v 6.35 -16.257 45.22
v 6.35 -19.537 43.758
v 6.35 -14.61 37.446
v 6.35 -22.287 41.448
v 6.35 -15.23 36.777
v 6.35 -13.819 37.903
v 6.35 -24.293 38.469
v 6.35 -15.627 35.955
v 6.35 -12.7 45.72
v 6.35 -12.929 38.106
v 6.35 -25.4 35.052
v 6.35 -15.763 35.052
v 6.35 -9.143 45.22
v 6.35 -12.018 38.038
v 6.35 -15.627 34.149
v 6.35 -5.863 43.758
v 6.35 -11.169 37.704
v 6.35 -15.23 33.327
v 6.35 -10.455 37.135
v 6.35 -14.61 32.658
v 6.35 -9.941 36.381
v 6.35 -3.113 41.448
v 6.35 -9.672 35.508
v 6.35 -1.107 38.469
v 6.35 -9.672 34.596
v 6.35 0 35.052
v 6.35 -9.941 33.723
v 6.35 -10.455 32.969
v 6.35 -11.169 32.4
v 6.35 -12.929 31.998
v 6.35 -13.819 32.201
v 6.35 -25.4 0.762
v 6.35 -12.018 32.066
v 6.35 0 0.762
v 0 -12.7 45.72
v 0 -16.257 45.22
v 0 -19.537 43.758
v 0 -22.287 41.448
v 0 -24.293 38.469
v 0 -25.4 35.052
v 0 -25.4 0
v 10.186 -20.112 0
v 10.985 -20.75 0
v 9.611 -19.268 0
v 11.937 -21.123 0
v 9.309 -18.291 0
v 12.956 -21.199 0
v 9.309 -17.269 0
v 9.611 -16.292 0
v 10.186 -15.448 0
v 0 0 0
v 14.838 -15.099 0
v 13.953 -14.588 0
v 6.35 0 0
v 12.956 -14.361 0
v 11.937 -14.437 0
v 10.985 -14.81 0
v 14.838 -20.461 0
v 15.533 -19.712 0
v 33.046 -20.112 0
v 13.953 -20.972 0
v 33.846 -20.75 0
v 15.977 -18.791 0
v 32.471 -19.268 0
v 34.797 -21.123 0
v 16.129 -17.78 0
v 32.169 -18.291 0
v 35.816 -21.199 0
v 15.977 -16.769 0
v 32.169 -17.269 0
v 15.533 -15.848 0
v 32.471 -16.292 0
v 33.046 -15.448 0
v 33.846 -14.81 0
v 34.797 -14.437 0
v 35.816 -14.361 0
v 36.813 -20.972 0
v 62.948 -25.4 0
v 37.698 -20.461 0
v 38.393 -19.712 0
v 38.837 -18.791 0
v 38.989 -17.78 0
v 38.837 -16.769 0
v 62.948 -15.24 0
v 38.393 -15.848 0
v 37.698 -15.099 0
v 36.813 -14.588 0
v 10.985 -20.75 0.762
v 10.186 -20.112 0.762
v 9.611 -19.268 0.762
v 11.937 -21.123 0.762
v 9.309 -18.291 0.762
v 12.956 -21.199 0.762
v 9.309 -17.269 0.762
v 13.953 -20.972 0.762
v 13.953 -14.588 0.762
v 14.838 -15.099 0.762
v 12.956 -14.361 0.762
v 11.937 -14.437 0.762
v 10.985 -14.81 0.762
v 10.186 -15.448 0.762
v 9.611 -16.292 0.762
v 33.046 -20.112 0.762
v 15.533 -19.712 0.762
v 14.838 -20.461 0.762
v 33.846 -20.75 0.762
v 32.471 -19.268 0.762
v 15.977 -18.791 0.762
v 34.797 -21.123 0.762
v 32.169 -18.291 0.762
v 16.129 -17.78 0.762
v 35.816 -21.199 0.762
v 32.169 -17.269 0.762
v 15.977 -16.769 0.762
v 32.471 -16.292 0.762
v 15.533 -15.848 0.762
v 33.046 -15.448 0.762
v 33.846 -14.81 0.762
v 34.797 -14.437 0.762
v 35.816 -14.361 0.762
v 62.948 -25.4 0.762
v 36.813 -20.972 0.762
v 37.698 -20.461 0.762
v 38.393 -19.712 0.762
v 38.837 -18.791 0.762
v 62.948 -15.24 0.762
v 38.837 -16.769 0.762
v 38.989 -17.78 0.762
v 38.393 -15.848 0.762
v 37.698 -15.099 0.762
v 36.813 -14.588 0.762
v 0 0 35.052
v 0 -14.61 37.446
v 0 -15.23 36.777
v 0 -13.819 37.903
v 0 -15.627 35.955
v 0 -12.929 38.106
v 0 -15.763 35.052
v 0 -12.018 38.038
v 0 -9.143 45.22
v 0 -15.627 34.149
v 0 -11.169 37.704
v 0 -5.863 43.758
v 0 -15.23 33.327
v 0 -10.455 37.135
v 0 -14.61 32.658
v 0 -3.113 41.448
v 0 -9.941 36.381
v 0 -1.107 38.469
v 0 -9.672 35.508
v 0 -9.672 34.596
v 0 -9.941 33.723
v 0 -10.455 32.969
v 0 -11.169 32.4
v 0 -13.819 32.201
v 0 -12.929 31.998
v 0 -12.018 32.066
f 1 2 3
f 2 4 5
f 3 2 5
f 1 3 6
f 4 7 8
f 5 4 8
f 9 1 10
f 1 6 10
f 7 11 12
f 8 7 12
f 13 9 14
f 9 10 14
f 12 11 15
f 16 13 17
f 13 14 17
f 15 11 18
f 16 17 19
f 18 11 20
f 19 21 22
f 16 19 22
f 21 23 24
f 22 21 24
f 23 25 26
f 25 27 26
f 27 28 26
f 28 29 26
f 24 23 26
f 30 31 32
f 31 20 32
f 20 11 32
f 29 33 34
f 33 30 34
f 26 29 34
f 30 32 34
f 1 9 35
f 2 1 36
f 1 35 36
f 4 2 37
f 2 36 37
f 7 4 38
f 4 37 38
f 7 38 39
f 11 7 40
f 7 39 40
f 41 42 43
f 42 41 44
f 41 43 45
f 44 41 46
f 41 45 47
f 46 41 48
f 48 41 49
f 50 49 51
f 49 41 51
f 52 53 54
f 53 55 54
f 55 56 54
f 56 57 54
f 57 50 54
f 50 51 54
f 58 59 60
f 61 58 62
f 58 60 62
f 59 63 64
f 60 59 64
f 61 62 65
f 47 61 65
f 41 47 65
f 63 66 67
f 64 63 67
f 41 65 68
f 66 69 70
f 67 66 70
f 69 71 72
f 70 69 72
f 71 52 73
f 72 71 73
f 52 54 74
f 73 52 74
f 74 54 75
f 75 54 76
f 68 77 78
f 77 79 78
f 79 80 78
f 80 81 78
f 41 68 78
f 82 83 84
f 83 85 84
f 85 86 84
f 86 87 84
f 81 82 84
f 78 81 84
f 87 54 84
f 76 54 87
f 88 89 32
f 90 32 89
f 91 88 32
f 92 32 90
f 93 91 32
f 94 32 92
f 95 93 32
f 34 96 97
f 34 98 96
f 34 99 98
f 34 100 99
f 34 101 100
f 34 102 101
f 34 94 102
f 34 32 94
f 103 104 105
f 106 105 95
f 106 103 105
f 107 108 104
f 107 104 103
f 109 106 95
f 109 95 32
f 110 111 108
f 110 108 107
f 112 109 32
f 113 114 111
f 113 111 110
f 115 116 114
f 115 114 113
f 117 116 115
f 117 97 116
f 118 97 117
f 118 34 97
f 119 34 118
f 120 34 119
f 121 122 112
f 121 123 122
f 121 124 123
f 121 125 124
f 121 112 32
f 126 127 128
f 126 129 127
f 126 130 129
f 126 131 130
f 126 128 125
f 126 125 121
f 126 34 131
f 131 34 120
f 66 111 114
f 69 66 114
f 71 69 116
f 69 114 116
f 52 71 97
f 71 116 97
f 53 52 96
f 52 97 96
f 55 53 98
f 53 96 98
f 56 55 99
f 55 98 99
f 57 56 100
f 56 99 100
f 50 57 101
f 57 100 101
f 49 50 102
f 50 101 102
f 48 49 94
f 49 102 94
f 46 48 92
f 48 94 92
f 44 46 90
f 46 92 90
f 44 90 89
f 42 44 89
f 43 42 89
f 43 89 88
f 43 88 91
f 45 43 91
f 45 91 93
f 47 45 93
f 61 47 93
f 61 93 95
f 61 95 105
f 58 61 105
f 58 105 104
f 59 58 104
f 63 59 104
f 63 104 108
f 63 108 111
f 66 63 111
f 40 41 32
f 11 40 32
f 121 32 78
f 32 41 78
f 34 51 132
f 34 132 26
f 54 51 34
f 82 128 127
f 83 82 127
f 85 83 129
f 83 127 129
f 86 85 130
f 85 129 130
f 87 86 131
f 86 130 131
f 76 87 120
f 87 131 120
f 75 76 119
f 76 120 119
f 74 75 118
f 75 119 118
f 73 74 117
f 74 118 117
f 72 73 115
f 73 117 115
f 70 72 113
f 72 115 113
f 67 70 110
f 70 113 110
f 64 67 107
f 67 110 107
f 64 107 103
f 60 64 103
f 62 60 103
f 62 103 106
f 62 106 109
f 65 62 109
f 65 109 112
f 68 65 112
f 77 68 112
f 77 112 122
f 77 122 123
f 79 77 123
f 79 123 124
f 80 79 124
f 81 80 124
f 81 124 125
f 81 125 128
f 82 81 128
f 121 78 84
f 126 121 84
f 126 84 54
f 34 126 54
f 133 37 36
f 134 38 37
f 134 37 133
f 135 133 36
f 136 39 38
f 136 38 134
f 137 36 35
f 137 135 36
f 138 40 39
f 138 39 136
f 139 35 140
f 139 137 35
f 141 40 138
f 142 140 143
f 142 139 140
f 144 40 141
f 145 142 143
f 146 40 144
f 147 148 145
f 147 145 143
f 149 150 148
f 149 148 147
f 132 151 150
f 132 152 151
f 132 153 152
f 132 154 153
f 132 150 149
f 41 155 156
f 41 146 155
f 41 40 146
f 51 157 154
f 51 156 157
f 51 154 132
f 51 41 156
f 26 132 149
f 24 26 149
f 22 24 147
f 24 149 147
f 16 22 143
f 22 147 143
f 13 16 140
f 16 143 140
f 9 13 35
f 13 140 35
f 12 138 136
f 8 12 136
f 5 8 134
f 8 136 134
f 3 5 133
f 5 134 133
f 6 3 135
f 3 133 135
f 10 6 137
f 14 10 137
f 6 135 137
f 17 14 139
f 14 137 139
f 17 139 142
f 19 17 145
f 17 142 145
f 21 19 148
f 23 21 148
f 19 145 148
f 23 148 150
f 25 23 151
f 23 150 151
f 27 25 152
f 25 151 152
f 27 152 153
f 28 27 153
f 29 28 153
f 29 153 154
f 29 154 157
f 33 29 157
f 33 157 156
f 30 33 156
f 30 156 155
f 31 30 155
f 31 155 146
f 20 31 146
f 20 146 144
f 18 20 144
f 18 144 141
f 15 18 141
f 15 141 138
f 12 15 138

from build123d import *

# Parameters (mm, degrees)
F0_W     = 6.35
F0_H     = 25.4
F1_DEPTH = 45.72
F2_R     = 3.062636224
F3_DEPTH = 25.4
F5_DEPTH = 0.762
F6_DEPTH = 25.4
F7_R     = 3.429
F8_DEPTH = 25.4


with BuildPart() as f1:
    # F0 (on Top) → F1 (new body)
    with BuildSketch(Plane.XY):
        with Locations((3.175, -12.7)):
            Rectangle(F0_W, F0_H)
    extrude(amount=F1_DEPTH)

    # F2 (on face) → F3 (cut)
    with BuildSketch(Plane(origin=(0, 0, 0), x_dir=(0, -1, 0), z_dir=(-1, 0, 0))):
        with Locations((12.7, 35.052)):
            Circle(F2_R)
    extrude(amount=-F3_DEPTH, mode=Mode.SUBTRACT)

    # F0 (on Top) → F5 (join)
    with BuildSketch(Plane.XY):
        with Locations((3.175, -12.7)):
            Rectangle(F0_W, F0_H)
        Polygon((62.9475070931, -15.24), (6.35, 0), (6.35, -25.4), (62.9475070931, -25.4), align=None)
    extrude(amount=F5_DEPTH)

    # F4 (on face) → F6 (cut)
    with BuildSketch(Plane(origin=(0, 0, 0), x_dir=(0, -1, 0), z_dir=(-1, 0, 0))):
        with BuildLine():
            ThreePointArc((0, 35.052), (4.4069875196, 42.6991100957), (12.7, 45.72))
            Line((12.7, 45.72), (0, 45.72))
            Line((0, 45.72), (0, 35.052))
        make_face()
        with BuildLine():
            ThreePointArc((12.7, 45.72), (20.9930124804, 42.6991100957), (25.4, 35.052))
            Line((25.4, 35.052), (25.4, 45.72))
            Line((25.4, 45.72), (12.7, 45.72))
        make_face()
    extrude(amount=-F6_DEPTH, mode=Mode.SUBTRACT)

    # F7 (on face) → F8 (cut)
    with BuildSketch(Plane.XY.offset(0.762)):
        with Locations((12.7, -17.78)):
            Circle(F7_R)
        with Locations((35.56, -17.78)):
            Circle(F7_R)
    extrude(amount=-F8_DEPTH, mode=Mode.SUBTRACT)


solid = f1.part
